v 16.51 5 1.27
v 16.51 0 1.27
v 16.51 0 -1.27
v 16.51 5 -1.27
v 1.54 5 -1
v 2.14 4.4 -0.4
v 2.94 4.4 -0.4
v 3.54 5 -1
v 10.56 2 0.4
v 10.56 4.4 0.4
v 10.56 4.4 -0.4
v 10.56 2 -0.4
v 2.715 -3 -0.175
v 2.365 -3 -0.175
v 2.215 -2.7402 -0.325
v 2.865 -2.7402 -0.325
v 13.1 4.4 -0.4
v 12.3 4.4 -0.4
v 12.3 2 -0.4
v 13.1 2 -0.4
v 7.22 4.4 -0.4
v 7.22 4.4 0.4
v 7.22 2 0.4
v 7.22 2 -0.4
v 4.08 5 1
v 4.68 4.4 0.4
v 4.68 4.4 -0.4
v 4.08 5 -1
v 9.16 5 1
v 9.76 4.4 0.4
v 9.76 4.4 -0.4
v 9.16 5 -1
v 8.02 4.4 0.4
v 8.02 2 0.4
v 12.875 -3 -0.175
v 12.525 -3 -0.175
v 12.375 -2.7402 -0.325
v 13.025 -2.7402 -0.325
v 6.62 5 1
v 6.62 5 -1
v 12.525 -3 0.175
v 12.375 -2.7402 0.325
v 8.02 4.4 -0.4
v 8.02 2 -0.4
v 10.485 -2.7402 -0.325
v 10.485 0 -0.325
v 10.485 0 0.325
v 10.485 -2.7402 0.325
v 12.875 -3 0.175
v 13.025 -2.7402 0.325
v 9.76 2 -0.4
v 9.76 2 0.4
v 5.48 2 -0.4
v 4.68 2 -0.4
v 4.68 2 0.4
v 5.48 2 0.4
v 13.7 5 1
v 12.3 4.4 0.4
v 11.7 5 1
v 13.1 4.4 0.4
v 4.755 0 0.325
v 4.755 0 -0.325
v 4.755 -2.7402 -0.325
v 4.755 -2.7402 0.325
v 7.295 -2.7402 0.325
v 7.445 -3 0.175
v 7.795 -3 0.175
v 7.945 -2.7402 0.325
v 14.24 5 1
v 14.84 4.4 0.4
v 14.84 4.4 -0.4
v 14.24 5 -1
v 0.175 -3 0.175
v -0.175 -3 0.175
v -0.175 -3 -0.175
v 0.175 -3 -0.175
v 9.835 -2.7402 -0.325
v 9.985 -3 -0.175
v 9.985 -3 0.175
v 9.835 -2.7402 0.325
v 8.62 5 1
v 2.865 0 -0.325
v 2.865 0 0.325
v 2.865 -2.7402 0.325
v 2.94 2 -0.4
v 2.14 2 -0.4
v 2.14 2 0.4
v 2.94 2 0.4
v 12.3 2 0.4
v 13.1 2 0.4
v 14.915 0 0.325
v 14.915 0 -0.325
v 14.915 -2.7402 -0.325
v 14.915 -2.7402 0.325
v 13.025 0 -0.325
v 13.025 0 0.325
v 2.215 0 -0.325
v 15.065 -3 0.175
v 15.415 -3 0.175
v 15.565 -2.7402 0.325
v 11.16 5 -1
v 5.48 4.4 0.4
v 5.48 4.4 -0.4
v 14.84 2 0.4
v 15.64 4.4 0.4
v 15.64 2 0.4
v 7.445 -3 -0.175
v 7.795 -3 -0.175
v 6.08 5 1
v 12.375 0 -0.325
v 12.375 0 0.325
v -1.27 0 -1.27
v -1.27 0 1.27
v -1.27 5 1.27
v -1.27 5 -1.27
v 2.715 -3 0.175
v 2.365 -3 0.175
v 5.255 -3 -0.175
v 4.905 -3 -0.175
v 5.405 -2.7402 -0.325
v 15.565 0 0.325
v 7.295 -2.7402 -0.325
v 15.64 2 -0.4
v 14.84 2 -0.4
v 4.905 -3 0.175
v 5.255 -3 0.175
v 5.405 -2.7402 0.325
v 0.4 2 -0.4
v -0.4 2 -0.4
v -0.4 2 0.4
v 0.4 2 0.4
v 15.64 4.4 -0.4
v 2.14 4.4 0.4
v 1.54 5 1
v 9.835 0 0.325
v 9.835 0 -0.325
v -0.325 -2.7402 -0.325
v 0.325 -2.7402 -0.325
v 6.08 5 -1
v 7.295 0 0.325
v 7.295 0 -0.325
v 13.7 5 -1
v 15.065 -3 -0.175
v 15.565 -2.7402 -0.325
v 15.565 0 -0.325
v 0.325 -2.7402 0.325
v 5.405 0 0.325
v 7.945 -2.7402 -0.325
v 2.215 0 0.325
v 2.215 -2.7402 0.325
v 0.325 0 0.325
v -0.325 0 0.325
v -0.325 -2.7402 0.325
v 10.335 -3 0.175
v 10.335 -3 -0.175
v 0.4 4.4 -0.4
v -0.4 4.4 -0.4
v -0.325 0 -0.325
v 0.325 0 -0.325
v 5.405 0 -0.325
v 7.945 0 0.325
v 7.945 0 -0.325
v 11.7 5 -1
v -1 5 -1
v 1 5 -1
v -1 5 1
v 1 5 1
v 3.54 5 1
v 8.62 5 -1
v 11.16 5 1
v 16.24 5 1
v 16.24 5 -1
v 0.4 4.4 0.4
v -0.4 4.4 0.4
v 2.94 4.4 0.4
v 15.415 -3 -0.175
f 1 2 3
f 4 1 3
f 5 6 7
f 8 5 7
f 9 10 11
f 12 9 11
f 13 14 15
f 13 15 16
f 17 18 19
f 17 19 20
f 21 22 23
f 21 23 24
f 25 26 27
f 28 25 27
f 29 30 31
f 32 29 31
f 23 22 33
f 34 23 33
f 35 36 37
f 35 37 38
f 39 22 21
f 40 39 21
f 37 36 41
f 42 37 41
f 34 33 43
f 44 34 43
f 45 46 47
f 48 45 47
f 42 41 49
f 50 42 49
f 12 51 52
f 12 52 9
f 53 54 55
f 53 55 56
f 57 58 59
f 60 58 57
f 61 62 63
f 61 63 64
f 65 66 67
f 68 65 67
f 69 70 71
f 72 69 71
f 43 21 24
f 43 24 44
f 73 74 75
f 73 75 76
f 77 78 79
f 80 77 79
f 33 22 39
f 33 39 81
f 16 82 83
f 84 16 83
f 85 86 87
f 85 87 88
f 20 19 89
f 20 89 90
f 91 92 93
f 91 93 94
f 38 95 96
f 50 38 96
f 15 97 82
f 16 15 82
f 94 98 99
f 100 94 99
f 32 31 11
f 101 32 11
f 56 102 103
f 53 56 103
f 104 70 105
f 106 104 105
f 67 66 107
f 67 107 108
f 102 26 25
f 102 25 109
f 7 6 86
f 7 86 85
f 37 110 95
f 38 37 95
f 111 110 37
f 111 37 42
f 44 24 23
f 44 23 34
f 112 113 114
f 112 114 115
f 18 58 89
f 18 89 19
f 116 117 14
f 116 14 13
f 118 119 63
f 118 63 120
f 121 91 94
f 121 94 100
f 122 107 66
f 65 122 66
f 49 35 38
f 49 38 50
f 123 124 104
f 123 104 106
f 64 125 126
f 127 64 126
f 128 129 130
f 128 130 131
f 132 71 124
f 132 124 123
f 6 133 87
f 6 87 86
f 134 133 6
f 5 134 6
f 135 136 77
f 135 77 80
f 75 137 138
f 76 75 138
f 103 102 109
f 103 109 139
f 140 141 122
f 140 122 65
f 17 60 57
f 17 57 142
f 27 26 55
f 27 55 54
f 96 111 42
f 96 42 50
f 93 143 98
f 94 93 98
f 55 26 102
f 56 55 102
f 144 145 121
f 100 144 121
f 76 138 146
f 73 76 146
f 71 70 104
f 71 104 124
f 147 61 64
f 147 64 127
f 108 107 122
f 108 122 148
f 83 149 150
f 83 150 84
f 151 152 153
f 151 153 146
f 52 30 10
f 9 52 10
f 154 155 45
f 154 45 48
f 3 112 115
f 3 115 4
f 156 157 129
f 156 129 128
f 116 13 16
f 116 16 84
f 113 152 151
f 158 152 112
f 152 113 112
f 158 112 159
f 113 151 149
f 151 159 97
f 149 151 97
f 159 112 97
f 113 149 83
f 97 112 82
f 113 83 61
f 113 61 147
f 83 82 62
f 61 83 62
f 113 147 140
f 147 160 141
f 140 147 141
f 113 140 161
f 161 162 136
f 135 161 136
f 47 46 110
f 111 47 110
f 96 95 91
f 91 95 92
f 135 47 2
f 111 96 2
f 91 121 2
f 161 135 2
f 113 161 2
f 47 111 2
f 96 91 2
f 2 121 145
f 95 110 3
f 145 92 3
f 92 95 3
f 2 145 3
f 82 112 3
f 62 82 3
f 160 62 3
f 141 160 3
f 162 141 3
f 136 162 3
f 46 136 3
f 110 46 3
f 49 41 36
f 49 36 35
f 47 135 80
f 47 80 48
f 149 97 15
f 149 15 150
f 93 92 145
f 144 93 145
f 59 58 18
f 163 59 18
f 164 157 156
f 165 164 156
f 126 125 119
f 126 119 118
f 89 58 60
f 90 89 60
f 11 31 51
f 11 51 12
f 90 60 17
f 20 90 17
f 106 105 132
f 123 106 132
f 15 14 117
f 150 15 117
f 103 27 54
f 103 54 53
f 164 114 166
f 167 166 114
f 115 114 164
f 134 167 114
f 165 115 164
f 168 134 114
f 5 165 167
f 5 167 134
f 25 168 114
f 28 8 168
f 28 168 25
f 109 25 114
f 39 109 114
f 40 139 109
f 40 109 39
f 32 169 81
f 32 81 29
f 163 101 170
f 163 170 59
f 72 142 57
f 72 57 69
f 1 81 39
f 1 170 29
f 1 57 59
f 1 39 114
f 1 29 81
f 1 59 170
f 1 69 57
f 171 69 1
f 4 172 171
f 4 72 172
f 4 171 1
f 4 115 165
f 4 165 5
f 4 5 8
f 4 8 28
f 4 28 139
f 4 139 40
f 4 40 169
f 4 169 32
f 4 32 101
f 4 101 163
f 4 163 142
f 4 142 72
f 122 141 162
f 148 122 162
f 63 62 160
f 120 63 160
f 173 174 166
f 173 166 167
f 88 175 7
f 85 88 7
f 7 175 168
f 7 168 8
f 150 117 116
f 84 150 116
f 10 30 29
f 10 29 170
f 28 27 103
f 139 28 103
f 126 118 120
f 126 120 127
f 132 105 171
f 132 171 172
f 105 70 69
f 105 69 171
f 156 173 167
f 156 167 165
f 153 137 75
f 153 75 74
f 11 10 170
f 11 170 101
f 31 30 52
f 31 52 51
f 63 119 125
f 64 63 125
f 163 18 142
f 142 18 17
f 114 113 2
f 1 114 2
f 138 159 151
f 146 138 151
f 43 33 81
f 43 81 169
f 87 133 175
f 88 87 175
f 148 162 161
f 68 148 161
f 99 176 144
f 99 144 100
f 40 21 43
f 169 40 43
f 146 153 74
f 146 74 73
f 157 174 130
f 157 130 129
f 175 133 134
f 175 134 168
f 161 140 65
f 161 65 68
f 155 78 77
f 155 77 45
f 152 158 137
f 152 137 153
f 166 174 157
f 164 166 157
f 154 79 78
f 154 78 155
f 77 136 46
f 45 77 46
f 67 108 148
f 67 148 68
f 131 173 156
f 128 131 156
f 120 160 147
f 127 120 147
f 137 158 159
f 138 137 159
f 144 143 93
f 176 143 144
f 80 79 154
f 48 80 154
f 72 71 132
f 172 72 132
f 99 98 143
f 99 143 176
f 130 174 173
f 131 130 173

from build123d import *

# Parameters (mm, degrees)
SKETCH1_W                   = 2.54
SKETCH1_H                   = 2.54
BOSS_EXTRUDE1_DEPTH         = 5
SKETCH2_W                   = 0.65
SKETCH2_H                   = 0.65
BOSS_EXTRUDE2_DEPTH         = 3
CHAMFER1_SIZE               = 0.15
CHAMFER1_SIZE2              = 0.259807621
SKETCH3_W                   = 0.8
SKETCH3_H                   = 0.8
CUT_EXTRUDE1_DEPTH          = 3
CHAMFER2_SIZE               = 0.6
LPATTERN1_COUNT             = 7
LPATTERN1_PITCH             = 2.54
CHAMFER1_OF_LPATTERN1_SIZE2 = 0.15
CHAMFER1_OF_LPATTERN1_SIZE  = 0.259807621
CHAMFER2_OF_LPATTERN1_SIZE  = 0.6


with BuildPart() as part:
    # Sketch1 → Boss-Extrude1 (new body)
    with BuildSketch(Plane(origin=(0, 0, 0), x_dir=(1, 0, 0), z_dir=(0, 1, 0))):
        Rectangle(SKETCH1_W, SKETCH1_H)
    boss_extrude1 = extrude(amount=BOSS_EXTRUDE1_DEPTH)

    # Sketch2 → Boss-Extrude2 (add)
    with BuildSketch(Plane.XZ):
        Rectangle(SKETCH2_W, SKETCH2_H)
    boss_extrude2 = extrude(amount=BOSS_EXTRUDE2_DEPTH)

    # Chamfer1
    chamfer1_edges = [part.edges().sort_by_distance(p)[0] for p in [
        (0.325, -3, 0),
        (0, -3, 0.325),
        (-0.325, -3, 0),
        (0, -3, -0.325),
    ]]
    chamfer1_side = [part.faces().sort_by_distance(p)[0] for p in [
        (0, -3, 0),
    ]]
    chamfer(chamfer1_edges, length=CHAMFER1_SIZE, length2=CHAMFER1_SIZE2, reference=chamfer1_side[0])

    # Sketch3 → Cut-Extrude1 (cut)
    with BuildSketch(Plane(origin=(0, 5, 0), x_dir=(1, 0, 0), z_dir=(0, 1, 0))):
        Rectangle(SKETCH3_W, SKETCH3_H)
    cut_extrude1 = extrude(amount=-CUT_EXTRUDE1_DEPTH, mode=Mode.SUBTRACT)

    # Chamfer2
    chamfer2_edges = [part.edges().sort_by_distance(p)[0] for p in [
        (0.4, 5, 0),
        (0, 5, -0.4),
        (-0.4, 5, 0),
        (0, 5, 0.4),
    ]]
    chamfer(chamfer2_edges, length=CHAMFER2_SIZE)

    # LPattern1: Boss-Extrude1, Boss-Extrude2, Cut-Extrude1 ×7
    with Locations(*[(i * LPATTERN1_PITCH, 0, 0) for i in range(1, LPATTERN1_COUNT)]):
        add(boss_extrude1)
        add(boss_extrude2)
        add(cut_extrude1, mode=Mode.SUBTRACT)

    # Chamfer1 of LPattern1
    chamfer1_of_lpattern1_edges = [part.edges().sort_by_distance(p)[0] for p in [
        (2.865, -3, 0),
        (2.54, -3, 0.325),
        (2.215, -3, 0),
        (2.54, -3, -0.325),
        (5.405, -3, 0),
        (5.08, -3, 0.325),
        (4.755, -3, 0),
        (5.08, -3, -0.325),
        (7.945, -3, 0),
        (7.62, -3, 0.325),
        (7.295, -3, 0),
        (7.62, -3, -0.325),
        (10.485, -3, 0),
        (10.16, -3, 0.325),
        (9.835, -3, 0),
        (10.16, -3, -0.325),
        (13.025, -3, 0),
        (12.7, -3, 0.325),
        (12.375, -3, 0),
        (12.7, -3, -0.325),
        (15.565, -3, 0),
        (15.24, -3, 0.325),
        (14.915, -3, 0),
        (15.24, -3, -0.325),
    ]]
    chamfer(chamfer1_of_lpattern1_edges, length=CHAMFER1_OF_LPATTERN1_SIZE, length2=CHAMFER1_OF_LPATTERN1_SIZE2)

    # Chamfer2 of LPattern1
    chamfer2_of_lpattern1_edges = [part.edges().sort_by_distance(p)[0] for p in [
        (2.94, 5, 0),
        (2.54, 5, -0.4),
        (2.14, 5, 0),
        (2.54, 5, 0.4),
        (5.48, 5, 0),
        (5.08, 5, -0.4),
        (4.68, 5, 0),
        (5.08, 5, 0.4),
        (8.02, 5, 0),
        (7.62, 5, -0.4),
        (7.22, 5, 0),
        (7.62, 5, 0.4),
        (10.56, 5, 0),
        (10.16, 5, -0.4),
        (9.76, 5, 0),
        (10.16, 5, 0.4),
        (13.1, 5, 0),
        (12.7, 5, -0.4),
        (12.3, 5, 0),
        (12.7, 5, 0.4),
        (15.64, 5, 0),
        (15.24, 5, -0.4),
        (14.84, 5, 0),
        (15.24, 5, 0.4),
    ]]
    chamfer(chamfer2_of_lpattern1_edges, length=CHAMFER2_OF_LPATTERN1_SIZE)


solid = part.part
